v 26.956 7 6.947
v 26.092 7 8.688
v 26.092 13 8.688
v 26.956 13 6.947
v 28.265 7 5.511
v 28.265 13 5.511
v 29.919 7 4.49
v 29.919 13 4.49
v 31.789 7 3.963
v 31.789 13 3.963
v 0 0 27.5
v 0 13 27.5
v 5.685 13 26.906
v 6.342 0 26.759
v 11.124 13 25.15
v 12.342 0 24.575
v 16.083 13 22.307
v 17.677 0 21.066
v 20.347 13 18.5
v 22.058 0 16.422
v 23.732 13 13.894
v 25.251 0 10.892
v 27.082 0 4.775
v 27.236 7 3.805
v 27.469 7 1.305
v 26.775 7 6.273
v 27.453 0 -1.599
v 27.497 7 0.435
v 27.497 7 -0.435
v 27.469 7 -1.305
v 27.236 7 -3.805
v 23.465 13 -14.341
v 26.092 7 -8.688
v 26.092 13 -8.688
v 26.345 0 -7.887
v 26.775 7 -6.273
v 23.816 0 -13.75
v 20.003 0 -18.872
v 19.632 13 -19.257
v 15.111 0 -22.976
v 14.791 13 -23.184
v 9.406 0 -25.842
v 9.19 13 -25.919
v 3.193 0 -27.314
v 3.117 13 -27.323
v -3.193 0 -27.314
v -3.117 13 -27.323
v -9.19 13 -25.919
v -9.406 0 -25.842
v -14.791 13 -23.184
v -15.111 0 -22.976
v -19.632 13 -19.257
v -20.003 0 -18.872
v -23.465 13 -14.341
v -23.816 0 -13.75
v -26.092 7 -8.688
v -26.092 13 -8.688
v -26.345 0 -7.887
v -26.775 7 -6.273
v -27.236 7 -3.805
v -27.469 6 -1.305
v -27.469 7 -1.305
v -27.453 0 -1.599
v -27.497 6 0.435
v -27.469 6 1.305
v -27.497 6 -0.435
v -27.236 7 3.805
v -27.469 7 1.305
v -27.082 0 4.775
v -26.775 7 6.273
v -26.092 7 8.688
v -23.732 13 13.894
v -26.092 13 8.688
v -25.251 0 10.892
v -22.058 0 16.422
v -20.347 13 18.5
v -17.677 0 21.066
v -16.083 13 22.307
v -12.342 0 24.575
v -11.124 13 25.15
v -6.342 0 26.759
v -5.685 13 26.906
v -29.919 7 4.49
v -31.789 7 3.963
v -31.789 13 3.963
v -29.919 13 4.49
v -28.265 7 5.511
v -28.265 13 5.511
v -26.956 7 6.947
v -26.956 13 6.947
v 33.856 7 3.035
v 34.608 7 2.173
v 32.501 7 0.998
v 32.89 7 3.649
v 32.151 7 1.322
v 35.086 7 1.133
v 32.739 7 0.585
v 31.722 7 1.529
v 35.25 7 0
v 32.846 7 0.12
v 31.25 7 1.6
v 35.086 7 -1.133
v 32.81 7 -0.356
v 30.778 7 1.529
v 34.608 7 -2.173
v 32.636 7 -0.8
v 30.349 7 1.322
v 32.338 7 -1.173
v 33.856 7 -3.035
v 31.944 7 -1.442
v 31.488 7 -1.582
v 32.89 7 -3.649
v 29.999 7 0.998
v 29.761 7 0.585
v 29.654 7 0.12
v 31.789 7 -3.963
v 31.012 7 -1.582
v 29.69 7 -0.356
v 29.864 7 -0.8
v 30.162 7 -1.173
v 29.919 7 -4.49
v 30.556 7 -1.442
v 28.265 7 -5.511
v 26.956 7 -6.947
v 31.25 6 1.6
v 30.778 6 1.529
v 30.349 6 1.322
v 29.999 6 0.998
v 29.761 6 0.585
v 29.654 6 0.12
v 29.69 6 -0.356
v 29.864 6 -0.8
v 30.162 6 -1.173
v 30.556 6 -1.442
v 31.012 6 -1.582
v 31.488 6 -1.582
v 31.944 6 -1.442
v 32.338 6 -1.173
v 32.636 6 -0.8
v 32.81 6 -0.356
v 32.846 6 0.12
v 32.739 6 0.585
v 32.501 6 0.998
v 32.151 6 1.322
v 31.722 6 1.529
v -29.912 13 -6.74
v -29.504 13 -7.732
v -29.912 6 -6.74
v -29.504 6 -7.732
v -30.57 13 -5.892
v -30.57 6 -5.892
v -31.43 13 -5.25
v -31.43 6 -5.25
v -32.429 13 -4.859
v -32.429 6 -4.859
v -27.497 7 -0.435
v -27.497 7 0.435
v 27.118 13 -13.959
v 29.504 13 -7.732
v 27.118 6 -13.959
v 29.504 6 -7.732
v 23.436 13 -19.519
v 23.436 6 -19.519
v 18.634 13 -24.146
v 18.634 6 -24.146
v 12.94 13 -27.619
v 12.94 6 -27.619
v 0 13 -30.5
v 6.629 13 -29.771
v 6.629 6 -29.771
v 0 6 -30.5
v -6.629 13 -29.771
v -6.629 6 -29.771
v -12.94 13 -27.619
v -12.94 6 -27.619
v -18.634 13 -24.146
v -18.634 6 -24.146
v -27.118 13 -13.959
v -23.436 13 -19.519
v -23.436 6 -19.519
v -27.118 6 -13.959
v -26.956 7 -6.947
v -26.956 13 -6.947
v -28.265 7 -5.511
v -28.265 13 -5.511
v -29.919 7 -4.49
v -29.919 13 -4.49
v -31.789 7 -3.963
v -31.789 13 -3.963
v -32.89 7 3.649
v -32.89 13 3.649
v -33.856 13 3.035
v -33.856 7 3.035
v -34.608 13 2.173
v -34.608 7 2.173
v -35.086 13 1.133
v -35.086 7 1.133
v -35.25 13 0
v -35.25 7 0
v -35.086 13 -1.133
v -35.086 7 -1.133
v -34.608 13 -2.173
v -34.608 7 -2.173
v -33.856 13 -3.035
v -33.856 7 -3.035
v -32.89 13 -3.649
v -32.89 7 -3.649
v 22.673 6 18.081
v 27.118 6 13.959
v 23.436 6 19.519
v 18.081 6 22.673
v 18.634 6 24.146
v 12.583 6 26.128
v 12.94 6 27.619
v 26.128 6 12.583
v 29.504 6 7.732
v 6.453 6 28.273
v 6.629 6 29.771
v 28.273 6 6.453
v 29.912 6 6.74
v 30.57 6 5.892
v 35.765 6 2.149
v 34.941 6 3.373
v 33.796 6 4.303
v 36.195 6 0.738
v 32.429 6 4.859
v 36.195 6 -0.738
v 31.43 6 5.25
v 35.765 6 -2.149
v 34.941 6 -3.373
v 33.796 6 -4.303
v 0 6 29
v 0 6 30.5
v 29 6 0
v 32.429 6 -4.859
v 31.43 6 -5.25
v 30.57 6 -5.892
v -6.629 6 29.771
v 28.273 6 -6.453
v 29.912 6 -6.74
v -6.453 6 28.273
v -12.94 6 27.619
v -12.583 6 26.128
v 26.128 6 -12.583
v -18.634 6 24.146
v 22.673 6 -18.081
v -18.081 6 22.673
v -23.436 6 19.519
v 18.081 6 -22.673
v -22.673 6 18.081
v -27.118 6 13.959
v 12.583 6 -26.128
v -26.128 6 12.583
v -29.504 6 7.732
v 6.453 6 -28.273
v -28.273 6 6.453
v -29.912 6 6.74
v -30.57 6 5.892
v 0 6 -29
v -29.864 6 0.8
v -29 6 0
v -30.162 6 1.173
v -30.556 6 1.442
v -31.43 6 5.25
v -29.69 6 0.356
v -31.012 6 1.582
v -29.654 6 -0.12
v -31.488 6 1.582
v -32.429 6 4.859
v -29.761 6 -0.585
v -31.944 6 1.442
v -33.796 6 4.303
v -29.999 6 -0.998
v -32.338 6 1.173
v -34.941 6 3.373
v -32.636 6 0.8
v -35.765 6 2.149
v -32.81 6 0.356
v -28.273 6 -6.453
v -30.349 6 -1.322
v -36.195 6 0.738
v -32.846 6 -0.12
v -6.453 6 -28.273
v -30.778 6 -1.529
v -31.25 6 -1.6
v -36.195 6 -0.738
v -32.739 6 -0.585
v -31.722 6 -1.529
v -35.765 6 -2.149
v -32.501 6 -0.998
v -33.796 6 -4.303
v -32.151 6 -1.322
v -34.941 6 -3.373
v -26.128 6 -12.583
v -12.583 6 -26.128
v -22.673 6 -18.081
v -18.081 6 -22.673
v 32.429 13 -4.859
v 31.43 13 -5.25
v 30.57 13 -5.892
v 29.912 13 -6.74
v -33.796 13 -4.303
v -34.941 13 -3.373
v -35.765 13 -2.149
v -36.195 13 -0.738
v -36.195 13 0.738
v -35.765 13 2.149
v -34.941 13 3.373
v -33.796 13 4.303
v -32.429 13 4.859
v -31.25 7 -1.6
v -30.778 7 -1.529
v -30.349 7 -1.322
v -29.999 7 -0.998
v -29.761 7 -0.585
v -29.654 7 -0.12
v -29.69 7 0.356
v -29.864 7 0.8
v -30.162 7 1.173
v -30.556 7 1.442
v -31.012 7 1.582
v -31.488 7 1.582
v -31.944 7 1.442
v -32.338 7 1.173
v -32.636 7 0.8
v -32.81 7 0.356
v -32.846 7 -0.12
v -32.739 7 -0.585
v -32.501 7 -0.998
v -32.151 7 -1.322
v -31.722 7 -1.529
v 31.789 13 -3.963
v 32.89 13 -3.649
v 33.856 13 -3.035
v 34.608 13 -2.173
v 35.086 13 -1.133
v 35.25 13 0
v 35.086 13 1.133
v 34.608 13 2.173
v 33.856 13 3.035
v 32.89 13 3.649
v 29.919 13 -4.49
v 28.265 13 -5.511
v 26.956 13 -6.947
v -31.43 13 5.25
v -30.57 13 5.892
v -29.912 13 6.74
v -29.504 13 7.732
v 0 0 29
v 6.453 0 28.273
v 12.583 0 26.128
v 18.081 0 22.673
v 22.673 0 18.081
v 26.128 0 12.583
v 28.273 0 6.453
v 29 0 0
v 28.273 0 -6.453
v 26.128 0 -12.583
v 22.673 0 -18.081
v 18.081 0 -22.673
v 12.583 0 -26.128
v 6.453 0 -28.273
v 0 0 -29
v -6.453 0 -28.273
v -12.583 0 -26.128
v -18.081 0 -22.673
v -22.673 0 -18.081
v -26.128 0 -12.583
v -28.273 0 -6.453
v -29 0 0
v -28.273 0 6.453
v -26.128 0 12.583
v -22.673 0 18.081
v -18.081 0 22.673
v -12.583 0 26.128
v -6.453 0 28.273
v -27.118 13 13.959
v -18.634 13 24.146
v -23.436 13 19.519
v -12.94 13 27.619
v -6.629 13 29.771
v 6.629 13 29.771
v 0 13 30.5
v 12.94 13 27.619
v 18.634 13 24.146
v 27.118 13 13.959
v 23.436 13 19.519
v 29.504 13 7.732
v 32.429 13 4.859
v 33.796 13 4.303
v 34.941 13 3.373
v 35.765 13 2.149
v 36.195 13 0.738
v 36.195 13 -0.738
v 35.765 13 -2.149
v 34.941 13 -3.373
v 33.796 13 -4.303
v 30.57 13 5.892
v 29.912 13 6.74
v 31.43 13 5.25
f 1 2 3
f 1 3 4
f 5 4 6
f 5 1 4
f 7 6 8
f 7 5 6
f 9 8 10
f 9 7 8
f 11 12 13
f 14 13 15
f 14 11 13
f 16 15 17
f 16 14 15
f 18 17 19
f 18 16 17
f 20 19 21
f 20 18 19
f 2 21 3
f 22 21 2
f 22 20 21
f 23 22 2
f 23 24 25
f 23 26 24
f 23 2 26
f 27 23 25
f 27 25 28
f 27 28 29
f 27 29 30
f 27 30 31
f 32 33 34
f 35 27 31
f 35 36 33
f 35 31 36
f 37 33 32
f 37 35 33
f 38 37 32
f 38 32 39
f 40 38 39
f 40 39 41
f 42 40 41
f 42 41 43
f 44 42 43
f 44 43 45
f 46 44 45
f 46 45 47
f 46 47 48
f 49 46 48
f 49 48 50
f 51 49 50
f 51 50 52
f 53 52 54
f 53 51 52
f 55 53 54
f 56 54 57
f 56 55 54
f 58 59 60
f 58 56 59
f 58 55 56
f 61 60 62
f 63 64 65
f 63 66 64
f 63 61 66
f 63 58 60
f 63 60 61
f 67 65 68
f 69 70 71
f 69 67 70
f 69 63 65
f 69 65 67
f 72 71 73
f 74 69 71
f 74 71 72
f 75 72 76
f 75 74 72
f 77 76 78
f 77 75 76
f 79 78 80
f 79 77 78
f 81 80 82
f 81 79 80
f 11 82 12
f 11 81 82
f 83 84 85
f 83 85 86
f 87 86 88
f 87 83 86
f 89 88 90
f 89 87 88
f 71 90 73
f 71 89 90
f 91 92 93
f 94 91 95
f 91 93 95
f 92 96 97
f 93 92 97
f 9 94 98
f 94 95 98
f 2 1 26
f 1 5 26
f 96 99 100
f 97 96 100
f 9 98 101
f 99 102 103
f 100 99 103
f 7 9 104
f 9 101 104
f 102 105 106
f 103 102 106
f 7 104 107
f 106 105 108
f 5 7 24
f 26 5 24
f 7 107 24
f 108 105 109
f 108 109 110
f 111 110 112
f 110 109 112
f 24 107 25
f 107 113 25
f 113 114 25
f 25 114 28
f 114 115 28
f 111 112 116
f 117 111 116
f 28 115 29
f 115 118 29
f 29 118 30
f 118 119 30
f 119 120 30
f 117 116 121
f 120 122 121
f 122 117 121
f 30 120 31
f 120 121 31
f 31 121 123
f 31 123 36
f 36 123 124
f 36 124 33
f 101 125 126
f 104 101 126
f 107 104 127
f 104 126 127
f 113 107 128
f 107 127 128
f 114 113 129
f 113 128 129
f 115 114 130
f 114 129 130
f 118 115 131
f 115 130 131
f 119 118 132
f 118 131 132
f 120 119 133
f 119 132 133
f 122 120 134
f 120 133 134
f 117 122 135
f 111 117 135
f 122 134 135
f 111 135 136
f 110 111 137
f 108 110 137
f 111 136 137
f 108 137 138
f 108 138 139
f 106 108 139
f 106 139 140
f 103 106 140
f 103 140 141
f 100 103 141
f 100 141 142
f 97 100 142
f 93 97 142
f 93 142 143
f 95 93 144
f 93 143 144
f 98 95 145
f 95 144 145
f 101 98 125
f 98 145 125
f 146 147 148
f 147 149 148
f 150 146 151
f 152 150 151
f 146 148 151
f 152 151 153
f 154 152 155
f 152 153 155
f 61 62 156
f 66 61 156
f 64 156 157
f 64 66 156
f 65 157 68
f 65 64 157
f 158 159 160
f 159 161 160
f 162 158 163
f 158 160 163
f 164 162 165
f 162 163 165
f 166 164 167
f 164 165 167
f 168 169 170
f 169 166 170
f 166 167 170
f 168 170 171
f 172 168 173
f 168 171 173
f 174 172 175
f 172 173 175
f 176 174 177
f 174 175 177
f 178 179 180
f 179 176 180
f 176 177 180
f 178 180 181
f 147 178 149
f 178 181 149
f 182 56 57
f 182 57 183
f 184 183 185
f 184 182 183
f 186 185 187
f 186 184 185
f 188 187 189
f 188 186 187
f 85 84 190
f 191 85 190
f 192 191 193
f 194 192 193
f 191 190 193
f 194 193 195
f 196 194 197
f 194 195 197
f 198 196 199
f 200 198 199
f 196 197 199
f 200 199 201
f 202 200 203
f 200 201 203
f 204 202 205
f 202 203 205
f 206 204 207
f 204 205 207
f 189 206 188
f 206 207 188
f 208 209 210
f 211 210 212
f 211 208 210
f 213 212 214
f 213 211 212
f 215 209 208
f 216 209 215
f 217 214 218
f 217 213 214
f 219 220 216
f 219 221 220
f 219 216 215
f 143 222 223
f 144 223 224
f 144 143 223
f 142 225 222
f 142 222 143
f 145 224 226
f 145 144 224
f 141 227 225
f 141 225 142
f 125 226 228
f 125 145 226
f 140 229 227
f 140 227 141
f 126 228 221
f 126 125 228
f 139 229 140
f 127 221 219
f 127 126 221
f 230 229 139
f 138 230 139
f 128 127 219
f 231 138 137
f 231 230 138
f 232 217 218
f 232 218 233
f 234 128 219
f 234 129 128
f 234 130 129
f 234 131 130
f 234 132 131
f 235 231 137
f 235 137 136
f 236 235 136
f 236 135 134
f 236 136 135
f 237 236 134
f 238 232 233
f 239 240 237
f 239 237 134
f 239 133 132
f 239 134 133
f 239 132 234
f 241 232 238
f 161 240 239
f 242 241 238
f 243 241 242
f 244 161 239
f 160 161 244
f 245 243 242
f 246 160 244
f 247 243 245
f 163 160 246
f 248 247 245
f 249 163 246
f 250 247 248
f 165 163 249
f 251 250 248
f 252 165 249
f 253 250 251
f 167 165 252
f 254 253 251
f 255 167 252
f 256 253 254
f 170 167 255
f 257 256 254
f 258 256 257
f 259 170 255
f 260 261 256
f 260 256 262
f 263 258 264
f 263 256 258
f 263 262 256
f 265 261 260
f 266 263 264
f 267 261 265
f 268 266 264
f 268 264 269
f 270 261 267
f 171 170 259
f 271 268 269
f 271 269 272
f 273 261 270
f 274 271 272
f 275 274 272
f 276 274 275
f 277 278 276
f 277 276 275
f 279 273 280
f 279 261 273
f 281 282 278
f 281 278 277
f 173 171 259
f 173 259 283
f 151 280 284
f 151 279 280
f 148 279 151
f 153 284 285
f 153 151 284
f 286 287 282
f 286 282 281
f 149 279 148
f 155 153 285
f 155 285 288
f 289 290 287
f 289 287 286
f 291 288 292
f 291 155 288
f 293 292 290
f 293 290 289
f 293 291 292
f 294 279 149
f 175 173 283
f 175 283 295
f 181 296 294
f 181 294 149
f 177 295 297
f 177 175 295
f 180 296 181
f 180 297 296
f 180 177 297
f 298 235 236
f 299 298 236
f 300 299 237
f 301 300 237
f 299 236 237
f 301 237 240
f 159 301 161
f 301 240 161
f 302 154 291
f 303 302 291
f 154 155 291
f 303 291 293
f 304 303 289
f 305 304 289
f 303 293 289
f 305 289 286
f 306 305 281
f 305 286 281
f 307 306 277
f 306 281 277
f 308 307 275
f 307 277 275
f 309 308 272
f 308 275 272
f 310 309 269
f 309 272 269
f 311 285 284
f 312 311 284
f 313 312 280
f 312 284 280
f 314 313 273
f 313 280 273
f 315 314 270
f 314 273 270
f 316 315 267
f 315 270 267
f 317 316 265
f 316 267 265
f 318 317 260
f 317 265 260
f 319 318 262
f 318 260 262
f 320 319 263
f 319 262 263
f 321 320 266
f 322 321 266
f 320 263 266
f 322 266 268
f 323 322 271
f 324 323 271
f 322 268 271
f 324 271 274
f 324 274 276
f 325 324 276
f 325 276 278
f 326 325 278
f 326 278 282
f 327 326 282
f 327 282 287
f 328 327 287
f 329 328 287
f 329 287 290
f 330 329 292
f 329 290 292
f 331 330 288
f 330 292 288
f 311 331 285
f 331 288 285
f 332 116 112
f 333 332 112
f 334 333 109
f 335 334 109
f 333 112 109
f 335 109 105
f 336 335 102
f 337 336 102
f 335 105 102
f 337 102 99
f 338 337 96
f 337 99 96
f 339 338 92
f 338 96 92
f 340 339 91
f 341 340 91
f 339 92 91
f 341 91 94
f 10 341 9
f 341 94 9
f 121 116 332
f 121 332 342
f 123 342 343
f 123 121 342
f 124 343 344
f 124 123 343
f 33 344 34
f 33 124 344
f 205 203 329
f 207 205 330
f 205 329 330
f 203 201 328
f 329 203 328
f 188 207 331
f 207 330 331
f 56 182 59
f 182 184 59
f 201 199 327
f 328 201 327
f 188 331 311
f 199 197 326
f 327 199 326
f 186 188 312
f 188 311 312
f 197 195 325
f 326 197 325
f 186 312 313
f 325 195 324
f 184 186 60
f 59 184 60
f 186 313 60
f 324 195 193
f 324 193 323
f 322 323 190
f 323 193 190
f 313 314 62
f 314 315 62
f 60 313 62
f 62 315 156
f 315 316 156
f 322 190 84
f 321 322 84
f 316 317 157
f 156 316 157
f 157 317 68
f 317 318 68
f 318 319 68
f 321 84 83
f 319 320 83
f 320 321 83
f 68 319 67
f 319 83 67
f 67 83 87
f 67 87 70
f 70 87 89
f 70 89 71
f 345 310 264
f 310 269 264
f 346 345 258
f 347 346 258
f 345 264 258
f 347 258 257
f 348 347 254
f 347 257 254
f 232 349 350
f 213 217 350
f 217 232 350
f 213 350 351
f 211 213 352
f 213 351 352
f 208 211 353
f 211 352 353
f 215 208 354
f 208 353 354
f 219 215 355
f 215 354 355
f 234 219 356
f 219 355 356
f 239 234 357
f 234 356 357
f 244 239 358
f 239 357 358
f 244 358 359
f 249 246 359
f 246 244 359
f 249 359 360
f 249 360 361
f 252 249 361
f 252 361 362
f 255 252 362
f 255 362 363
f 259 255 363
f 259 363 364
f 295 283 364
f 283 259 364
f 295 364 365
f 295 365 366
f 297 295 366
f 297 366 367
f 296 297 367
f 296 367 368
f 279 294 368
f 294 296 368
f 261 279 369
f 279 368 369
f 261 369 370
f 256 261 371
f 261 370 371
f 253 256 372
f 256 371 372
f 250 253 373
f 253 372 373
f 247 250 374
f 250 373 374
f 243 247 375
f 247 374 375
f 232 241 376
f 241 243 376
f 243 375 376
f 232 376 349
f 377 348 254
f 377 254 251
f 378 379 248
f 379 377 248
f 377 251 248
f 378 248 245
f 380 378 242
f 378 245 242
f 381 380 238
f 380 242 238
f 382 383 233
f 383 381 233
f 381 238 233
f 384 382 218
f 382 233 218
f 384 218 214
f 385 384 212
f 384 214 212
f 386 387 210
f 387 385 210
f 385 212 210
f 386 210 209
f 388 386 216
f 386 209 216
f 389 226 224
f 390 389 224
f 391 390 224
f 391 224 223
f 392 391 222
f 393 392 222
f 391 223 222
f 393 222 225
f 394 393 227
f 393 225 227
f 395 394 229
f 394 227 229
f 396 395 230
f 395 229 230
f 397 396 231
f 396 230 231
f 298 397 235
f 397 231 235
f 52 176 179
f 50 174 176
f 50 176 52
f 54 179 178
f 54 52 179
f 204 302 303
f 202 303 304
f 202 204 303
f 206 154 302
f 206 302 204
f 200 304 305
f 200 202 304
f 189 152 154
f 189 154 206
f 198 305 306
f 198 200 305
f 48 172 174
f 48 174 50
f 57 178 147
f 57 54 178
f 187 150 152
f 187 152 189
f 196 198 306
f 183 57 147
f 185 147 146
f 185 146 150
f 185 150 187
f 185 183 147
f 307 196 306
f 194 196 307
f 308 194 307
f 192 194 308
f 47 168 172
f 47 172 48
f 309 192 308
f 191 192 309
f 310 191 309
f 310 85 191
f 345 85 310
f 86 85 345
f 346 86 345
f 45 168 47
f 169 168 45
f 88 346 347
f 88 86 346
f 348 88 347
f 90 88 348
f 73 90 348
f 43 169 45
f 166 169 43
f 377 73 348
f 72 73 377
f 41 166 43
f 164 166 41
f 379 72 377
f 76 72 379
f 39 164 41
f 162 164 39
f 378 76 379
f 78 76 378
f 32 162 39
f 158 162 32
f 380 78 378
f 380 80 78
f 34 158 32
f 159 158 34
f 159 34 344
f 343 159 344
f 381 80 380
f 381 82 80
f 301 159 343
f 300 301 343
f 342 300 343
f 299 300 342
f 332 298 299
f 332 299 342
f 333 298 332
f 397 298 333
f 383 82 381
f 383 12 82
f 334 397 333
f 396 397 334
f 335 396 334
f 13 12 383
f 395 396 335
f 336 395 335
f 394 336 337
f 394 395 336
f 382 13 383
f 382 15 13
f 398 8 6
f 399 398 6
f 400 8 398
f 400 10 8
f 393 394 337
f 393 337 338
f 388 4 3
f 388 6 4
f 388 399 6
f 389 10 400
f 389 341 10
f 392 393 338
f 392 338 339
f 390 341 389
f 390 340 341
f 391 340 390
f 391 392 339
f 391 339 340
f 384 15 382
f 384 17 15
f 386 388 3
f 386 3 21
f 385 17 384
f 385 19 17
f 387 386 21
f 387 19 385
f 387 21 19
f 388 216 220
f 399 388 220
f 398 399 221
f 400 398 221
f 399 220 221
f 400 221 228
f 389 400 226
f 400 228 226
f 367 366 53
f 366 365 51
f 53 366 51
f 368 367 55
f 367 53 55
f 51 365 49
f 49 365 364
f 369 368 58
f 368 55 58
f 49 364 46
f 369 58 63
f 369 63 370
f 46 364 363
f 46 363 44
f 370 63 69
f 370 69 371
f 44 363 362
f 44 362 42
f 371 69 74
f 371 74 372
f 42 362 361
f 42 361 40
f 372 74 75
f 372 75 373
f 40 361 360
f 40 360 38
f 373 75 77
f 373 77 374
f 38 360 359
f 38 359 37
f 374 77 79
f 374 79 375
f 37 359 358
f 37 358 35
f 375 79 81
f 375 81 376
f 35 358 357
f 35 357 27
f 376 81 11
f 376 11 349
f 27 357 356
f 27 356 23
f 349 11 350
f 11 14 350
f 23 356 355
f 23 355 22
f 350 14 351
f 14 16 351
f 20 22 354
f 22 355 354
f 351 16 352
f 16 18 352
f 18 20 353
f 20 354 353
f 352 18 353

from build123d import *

# Parameters (mm, degrees)
SKETCH1_R           = 29
SKETCH1_R_2         = 27.5
BOSS_EXTRUDE1_DEPTH = 6
SKETCH3_R           = 30.5
SKETCH3_R_2         = 27.5
BOSS_EXTRUDE3_DEPTH = 7
BOSS_EXTRUDE4_START = -6
BOSS_EXTRUDE4_DEPTH = 6
CUT_EXTRUDE1_START  = -7
SKETCH6_R           = 4
CUT_EXTRUDE1_DEPTH  = 7
BOSS_EXTRUDE5_START = 1
SKETCH8_R           = 4
SKETCH8_R_2         = 1.6
BOSS_EXTRUDE5_DEPTH = 1
CUT_EXTRUDE2_START  = -6
CUT_EXTRUDE2_DEPTH  = 6
CUT_EXTRUDE3_START  = -10
SKETCH10_R          = 27.5
CUT_EXTRUDE3_DEPTH  = 10
CIRPATTERN1_COUNT   = 2


with BuildPart() as part:
    # Sketch1 → Boss-Extrude1 (new body)
    with BuildSketch(Plane(origin=(0, 0, 0), x_dir=(1, 0, 0), z_dir=(0, 1, 0))):
        with Locations(Location((0, 0, 0), (0, 0, 270))):
            Circle(SKETCH1_R)
        with Locations(Location((0, 0, 0), (0, 0, 270))):
            Circle(SKETCH1_R_2, mode=Mode.SUBTRACT)
    extrude(amount=BOSS_EXTRUDE1_DEPTH)

    # Sketch3 → Boss-Extrude3 (add)
    with BuildSketch(Plane(origin=(0, 6, 0), x_dir=(1, 0, 0), z_dir=(0, 1, 0))):
        with Locations(Location((0, 0, 0), (0, 0, 270))):
            Circle(SKETCH3_R)
        with Locations(Location((0, 0, 0), (0, 0, 270))):
            Circle(SKETCH3_R_2, mode=Mode.SUBTRACT)
    extrude(amount=BOSS_EXTRUDE3_DEPTH)

    # Sketch4 → Boss-Extrude4 (add)
    with BuildSketch(Plane(origin=(0, 13, 0), x_dir=(1, 0, 0), z_dir=(0, 1, 0)).offset(BOSS_EXTRUDE4_START)):
        with BuildLine():
            ThreePointArc((-30.253, -3.873756704), (-35.25, 0), (-30.253, 3.873756704))
            ThreePointArc((-30.253, 3.873756704), (-30.245409649, 3.932581236), (-30.237704918, 3.991390897))
            ThreePointArc((-30.237704918, 3.991390897), (-29.929181214, 5.873168807), (-29.503666667, 7.731988956))
            ThreePointArc((-29.503666667, 7.731988956), (-30.570387885, 5.892011652), (-32.429444444, 4.858900164))
            ThreePointArc((-32.429444444, 4.858900164), (-36.25, 0), (-32.429444444, -4.858900164))
            ThreePointArc((-32.429444444, -4.858900164), (-30.570387885, -5.892011652), (-29.503666667, -7.731988956))
            ThreePointArc((-29.503666667, -7.731988956), (-29.929181214, -5.873168807), (-30.237704918, -3.991390897))
            ThreePointArc((-30.237704918, -3.991390897), (-30.245409649, -3.932581236), (-30.253, -3.873756704))
        make_face()
    boss_extrude4 = extrude(amount=BOSS_EXTRUDE4_DEPTH)

    # Sketch6 → Cut-Extrude1 (cut)
    with BuildSketch(Plane(origin=(0, 13, 0), x_dir=(1, 0, 0), z_dir=(0, 1, 0)).offset(CUT_EXTRUDE1_START)):
        with Locations((-31.25, 0)):
            Circle(SKETCH6_R)
    cut_extrude1 = extrude(amount=CUT_EXTRUDE1_DEPTH, mode=Mode.SUBTRACT)

    # Sketch8 → Boss-Extrude5 (add)
    # profile 1 of 2: a face of its own
    with BuildSketch(Plane.XZ.offset(-7).offset(BOSS_EXTRUDE5_START)):
        with Locations((-31.25, 0)):
            Circle(SKETCH8_R)
        with Locations(Location((-31.25, 0, 0), (0, 0, 270))):
            Circle(SKETCH8_R_2, mode=Mode.SUBTRACT)
    # profile 2 of 2: a face of its own
    with BuildSketch(Plane.XZ.offset(-7).offset(BOSS_EXTRUDE5_START)):
        with BuildLine():
            ThreePointArc((-30.253, -3.873756704), (-29.94054595, -5.814955562), (-29.503666667, -7.731988956))
            ThreePointArc((-29.503666667, -7.731988956), (-30.570387885, -5.892011652), (-32.429444444, -4.858900164))
            ThreePointArc((-32.429444444, -4.858900164), (-36.25, 0), (-32.429444444, 4.858900164))
            ThreePointArc((-32.429444444, 4.858900164), (-30.570387885, 5.892011652), (-29.503666667, 7.731988956))
            ThreePointArc((-29.503666667, 7.731988956), (-29.94054595, 5.814955562), (-30.253, 3.873756704))
            ThreePointArc((-30.253, 3.873756704), (-35.25, 0), (-30.253, -3.873756704))
        make_face()
    boss_extrude5 = extrude(amount=-BOSS_EXTRUDE5_DEPTH)

    # Sketch9 → Cut-Extrude2 (cut)
    with BuildSketch(Plane(origin=(0, 13, 0), x_dir=(1, 0, 0), z_dir=(0, 1, 0)).offset(CUT_EXTRUDE2_START)):
        with BuildLine():
            ThreePointArc((-27.469, 1.305388448), (-27.033467309, 5.04397118), (-26.091521739, 8.688066145))
            ThreePointArc((-26.091521739, 8.688066145), (-28.264861577, 5.511091819), (-31.789272727, 3.963481415))
            ThreePointArc((-31.789272727, 3.963481415), (-29.15391711, 3.406822055), (-27.469, 1.305388448))
        make_face()
        with BuildLine():
            ThreePointArc((-31.789272727, -3.963481415), (-28.264861577, -5.511091819), (-26.091521739, -8.688066145))
            ThreePointArc((-26.091521739, -8.688066145), (-27.033467309, -5.04397118), (-27.469, -1.305388448))
            ThreePointArc((-27.469, -1.305388448), (-29.15391711, -3.406822055), (-31.789272727, -3.963481415))
        make_face()
    cut_extrude2 = extrude(amount=CUT_EXTRUDE2_DEPTH, mode=Mode.SUBTRACT)

    # Sketch10 → Cut-Extrude3 (cut)
    with BuildSketch(Plane(origin=(0, 7, 0), x_dir=(1, 0, 0), z_dir=(0, 1, 0)).offset(CUT_EXTRUDE3_START)):
        with Locations(Location((0, 0, 0), (0, 0, 161.583053277))):
            Circle(SKETCH10_R)
    cut_extrude3 = extrude(amount=CUT_EXTRUDE3_DEPTH, mode=Mode.SUBTRACT)

    # CirPattern1: Boss-Extrude4, Cut-Extrude1, Boss-Extrude5, Cut-Extrude2, Cut-Extrude3 ×2 about axis
    cirpattern1_axis = Axis((0, 0, 0), (0, 1, 0))
    add([boss_extrude4.rotate(cirpattern1_axis, i * 360 / CIRPATTERN1_COUNT) for i in range(1, CIRPATTERN1_COUNT)])
    add([cut_extrude1.rotate(cirpattern1_axis, i * 360 / CIRPATTERN1_COUNT) for i in range(1, CIRPATTERN1_COUNT)], mode=Mode.SUBTRACT)
    add([boss_extrude5.rotate(cirpattern1_axis, i * 360 / CIRPATTERN1_COUNT) for i in range(1, CIRPATTERN1_COUNT)])
    add([cut_extrude2.rotate(cirpattern1_axis, i * 360 / CIRPATTERN1_COUNT) for i in range(1, CIRPATTERN1_COUNT)], mode=Mode.SUBTRACT)
    add([cut_extrude3.rotate(cirpattern1_axis, i * 360 / CIRPATTERN1_COUNT) for i in range(1, CIRPATTERN1_COUNT)], mode=Mode.SUBTRACT)


solid = part.part
